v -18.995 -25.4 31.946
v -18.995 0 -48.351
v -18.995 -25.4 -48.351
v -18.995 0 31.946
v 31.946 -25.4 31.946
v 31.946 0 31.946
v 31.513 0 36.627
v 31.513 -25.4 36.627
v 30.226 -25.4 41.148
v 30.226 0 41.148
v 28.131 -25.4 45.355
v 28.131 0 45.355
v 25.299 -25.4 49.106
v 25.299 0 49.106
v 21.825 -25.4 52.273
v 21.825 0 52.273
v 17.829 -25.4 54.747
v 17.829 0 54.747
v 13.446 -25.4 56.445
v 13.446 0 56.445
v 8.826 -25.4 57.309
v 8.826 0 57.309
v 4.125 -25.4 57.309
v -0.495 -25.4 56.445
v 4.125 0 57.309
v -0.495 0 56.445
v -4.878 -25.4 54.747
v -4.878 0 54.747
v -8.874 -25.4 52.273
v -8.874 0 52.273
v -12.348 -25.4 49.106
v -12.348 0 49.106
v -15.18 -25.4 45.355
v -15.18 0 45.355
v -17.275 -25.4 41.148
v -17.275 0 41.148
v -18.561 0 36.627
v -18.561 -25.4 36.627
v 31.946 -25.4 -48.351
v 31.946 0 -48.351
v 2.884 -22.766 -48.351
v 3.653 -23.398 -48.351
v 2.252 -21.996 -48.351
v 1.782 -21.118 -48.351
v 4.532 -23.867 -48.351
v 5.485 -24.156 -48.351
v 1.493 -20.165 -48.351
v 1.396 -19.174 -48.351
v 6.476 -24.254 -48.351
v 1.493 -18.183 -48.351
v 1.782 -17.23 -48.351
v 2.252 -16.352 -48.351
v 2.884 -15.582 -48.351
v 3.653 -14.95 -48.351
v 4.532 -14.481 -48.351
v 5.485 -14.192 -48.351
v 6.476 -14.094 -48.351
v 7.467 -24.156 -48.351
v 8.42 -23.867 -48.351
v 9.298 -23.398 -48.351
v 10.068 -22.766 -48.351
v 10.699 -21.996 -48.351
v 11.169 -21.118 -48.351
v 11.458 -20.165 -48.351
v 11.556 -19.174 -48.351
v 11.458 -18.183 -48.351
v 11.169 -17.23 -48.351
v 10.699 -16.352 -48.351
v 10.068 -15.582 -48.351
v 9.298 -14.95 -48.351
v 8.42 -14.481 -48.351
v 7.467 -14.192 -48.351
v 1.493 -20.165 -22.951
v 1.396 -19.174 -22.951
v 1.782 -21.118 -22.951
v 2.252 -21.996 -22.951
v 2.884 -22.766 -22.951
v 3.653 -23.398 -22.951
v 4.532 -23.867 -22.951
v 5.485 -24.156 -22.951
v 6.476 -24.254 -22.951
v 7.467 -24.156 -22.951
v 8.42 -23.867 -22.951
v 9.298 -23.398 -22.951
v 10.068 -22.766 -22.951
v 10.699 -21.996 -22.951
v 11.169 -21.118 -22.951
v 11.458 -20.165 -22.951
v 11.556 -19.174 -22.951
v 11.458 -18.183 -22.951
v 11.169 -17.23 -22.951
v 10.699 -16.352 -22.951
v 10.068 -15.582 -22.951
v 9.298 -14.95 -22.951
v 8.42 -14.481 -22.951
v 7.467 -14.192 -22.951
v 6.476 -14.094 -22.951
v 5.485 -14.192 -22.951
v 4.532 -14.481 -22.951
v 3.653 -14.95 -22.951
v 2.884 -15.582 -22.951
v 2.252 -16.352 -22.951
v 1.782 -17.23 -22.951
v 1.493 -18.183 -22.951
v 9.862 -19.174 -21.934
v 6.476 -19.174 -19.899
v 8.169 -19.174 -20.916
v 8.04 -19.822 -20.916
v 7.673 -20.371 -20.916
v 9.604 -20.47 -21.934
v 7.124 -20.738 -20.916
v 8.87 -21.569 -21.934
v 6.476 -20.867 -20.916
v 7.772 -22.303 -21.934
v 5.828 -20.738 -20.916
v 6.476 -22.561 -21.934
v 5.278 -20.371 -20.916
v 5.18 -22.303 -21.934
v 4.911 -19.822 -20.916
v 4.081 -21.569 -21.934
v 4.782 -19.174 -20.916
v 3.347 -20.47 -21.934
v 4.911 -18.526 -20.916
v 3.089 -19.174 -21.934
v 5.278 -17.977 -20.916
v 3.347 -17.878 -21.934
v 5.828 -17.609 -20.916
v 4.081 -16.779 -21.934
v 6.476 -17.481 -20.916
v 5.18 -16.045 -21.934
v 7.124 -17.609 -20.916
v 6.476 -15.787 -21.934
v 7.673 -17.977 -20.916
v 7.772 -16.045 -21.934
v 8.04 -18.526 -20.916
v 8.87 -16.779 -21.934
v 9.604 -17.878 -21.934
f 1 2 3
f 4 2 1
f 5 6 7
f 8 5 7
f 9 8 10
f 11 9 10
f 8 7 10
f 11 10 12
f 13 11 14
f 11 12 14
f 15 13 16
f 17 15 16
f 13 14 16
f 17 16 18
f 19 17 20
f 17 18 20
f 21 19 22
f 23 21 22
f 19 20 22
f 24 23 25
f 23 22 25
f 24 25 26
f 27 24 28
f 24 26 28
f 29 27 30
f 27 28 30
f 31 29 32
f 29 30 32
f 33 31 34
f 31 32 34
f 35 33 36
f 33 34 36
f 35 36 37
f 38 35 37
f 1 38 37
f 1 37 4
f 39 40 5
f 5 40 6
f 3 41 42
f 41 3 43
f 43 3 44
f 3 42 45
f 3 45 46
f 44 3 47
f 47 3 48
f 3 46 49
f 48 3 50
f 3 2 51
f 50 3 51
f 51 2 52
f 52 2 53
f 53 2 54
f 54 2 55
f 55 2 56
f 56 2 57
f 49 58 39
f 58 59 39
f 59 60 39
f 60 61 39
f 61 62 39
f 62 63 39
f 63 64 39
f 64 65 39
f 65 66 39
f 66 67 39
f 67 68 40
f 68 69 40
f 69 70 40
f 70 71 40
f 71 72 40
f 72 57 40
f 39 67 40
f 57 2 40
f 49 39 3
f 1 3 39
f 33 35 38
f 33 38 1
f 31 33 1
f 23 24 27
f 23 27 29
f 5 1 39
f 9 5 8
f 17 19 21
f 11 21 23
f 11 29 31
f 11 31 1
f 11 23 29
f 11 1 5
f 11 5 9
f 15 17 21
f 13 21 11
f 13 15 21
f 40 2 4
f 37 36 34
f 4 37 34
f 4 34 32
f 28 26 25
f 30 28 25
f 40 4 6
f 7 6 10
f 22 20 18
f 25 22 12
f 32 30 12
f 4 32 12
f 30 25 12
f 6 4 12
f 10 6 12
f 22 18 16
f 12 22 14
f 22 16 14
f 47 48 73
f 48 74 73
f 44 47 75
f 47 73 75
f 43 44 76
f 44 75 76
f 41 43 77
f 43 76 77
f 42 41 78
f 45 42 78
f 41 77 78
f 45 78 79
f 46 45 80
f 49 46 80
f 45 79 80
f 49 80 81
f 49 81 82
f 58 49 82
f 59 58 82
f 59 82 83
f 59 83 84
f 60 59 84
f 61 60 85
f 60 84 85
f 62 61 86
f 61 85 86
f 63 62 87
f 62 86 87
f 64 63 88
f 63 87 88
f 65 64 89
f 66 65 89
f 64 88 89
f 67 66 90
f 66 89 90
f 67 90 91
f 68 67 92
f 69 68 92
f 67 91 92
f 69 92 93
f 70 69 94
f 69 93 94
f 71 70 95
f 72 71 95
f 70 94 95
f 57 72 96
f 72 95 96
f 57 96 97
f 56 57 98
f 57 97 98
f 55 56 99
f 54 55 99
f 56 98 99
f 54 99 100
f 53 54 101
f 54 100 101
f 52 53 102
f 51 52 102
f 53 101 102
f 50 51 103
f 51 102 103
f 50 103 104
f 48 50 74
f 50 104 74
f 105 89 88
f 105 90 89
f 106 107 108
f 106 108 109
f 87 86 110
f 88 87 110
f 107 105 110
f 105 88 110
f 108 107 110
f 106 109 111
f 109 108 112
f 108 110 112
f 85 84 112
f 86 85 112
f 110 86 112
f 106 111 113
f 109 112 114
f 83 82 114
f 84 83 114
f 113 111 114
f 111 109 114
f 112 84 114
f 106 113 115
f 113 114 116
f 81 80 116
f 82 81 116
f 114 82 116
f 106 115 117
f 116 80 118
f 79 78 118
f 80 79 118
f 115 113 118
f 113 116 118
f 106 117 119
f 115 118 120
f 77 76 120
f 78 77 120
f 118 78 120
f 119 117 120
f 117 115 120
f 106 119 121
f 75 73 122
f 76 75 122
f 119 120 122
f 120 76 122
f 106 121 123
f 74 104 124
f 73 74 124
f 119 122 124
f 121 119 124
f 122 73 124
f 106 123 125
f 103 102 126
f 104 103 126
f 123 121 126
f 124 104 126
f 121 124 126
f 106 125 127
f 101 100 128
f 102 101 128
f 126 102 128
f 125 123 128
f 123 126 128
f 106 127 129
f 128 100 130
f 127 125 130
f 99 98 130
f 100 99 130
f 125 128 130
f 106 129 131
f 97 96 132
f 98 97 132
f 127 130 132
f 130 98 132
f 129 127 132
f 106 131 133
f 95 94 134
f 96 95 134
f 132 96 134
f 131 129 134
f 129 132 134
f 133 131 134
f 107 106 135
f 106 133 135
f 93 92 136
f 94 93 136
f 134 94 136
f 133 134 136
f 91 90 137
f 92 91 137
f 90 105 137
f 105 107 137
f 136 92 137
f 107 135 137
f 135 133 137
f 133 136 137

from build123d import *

# Parameters (mm, degrees)
F0_W     = 50.9416162968
F0_H     = 80.2978053689
F1_DEPTH = 25.4
F3_D     = 10.16
F3_DEPTH = 25.4
F3_TIP   = 3.0523719447


with BuildPart() as f1:
    # F0 (on Front) → F1 (new body)
    with BuildSketch(Plane.XZ):
        with BuildLine():
            ThreePointArc((31.9464355707, 31.946439296), (6.4756274223, 57.4172474444), (-18.9951807261, 31.946439296))
            Line((-18.9951807261, 31.946439296), (31.9464355707, 31.946439296))
        make_face()
        with Locations((6.4756274223, -8.2024633884)):
            Rectangle(F0_W, F0_H)
    extrude(amount=F1_DEPTH)

    # F3
    with Locations(Plane(origin=(0, 0, -48.3513660729), x_dir=(1, 0, 0), z_dir=(0, 0, -1))):
        with Locations((6.4756274223, 19.1739164293)):
            Hole(F3_D / 2, depth=F3_DEPTH)
            with Locations((0, 0, -(F3_DEPTH + F3_TIP / 2))):  # 118° drill point
                Cone(0, F3_D / 2, F3_TIP, mode=Mode.SUBTRACT)


solid = f1.part
